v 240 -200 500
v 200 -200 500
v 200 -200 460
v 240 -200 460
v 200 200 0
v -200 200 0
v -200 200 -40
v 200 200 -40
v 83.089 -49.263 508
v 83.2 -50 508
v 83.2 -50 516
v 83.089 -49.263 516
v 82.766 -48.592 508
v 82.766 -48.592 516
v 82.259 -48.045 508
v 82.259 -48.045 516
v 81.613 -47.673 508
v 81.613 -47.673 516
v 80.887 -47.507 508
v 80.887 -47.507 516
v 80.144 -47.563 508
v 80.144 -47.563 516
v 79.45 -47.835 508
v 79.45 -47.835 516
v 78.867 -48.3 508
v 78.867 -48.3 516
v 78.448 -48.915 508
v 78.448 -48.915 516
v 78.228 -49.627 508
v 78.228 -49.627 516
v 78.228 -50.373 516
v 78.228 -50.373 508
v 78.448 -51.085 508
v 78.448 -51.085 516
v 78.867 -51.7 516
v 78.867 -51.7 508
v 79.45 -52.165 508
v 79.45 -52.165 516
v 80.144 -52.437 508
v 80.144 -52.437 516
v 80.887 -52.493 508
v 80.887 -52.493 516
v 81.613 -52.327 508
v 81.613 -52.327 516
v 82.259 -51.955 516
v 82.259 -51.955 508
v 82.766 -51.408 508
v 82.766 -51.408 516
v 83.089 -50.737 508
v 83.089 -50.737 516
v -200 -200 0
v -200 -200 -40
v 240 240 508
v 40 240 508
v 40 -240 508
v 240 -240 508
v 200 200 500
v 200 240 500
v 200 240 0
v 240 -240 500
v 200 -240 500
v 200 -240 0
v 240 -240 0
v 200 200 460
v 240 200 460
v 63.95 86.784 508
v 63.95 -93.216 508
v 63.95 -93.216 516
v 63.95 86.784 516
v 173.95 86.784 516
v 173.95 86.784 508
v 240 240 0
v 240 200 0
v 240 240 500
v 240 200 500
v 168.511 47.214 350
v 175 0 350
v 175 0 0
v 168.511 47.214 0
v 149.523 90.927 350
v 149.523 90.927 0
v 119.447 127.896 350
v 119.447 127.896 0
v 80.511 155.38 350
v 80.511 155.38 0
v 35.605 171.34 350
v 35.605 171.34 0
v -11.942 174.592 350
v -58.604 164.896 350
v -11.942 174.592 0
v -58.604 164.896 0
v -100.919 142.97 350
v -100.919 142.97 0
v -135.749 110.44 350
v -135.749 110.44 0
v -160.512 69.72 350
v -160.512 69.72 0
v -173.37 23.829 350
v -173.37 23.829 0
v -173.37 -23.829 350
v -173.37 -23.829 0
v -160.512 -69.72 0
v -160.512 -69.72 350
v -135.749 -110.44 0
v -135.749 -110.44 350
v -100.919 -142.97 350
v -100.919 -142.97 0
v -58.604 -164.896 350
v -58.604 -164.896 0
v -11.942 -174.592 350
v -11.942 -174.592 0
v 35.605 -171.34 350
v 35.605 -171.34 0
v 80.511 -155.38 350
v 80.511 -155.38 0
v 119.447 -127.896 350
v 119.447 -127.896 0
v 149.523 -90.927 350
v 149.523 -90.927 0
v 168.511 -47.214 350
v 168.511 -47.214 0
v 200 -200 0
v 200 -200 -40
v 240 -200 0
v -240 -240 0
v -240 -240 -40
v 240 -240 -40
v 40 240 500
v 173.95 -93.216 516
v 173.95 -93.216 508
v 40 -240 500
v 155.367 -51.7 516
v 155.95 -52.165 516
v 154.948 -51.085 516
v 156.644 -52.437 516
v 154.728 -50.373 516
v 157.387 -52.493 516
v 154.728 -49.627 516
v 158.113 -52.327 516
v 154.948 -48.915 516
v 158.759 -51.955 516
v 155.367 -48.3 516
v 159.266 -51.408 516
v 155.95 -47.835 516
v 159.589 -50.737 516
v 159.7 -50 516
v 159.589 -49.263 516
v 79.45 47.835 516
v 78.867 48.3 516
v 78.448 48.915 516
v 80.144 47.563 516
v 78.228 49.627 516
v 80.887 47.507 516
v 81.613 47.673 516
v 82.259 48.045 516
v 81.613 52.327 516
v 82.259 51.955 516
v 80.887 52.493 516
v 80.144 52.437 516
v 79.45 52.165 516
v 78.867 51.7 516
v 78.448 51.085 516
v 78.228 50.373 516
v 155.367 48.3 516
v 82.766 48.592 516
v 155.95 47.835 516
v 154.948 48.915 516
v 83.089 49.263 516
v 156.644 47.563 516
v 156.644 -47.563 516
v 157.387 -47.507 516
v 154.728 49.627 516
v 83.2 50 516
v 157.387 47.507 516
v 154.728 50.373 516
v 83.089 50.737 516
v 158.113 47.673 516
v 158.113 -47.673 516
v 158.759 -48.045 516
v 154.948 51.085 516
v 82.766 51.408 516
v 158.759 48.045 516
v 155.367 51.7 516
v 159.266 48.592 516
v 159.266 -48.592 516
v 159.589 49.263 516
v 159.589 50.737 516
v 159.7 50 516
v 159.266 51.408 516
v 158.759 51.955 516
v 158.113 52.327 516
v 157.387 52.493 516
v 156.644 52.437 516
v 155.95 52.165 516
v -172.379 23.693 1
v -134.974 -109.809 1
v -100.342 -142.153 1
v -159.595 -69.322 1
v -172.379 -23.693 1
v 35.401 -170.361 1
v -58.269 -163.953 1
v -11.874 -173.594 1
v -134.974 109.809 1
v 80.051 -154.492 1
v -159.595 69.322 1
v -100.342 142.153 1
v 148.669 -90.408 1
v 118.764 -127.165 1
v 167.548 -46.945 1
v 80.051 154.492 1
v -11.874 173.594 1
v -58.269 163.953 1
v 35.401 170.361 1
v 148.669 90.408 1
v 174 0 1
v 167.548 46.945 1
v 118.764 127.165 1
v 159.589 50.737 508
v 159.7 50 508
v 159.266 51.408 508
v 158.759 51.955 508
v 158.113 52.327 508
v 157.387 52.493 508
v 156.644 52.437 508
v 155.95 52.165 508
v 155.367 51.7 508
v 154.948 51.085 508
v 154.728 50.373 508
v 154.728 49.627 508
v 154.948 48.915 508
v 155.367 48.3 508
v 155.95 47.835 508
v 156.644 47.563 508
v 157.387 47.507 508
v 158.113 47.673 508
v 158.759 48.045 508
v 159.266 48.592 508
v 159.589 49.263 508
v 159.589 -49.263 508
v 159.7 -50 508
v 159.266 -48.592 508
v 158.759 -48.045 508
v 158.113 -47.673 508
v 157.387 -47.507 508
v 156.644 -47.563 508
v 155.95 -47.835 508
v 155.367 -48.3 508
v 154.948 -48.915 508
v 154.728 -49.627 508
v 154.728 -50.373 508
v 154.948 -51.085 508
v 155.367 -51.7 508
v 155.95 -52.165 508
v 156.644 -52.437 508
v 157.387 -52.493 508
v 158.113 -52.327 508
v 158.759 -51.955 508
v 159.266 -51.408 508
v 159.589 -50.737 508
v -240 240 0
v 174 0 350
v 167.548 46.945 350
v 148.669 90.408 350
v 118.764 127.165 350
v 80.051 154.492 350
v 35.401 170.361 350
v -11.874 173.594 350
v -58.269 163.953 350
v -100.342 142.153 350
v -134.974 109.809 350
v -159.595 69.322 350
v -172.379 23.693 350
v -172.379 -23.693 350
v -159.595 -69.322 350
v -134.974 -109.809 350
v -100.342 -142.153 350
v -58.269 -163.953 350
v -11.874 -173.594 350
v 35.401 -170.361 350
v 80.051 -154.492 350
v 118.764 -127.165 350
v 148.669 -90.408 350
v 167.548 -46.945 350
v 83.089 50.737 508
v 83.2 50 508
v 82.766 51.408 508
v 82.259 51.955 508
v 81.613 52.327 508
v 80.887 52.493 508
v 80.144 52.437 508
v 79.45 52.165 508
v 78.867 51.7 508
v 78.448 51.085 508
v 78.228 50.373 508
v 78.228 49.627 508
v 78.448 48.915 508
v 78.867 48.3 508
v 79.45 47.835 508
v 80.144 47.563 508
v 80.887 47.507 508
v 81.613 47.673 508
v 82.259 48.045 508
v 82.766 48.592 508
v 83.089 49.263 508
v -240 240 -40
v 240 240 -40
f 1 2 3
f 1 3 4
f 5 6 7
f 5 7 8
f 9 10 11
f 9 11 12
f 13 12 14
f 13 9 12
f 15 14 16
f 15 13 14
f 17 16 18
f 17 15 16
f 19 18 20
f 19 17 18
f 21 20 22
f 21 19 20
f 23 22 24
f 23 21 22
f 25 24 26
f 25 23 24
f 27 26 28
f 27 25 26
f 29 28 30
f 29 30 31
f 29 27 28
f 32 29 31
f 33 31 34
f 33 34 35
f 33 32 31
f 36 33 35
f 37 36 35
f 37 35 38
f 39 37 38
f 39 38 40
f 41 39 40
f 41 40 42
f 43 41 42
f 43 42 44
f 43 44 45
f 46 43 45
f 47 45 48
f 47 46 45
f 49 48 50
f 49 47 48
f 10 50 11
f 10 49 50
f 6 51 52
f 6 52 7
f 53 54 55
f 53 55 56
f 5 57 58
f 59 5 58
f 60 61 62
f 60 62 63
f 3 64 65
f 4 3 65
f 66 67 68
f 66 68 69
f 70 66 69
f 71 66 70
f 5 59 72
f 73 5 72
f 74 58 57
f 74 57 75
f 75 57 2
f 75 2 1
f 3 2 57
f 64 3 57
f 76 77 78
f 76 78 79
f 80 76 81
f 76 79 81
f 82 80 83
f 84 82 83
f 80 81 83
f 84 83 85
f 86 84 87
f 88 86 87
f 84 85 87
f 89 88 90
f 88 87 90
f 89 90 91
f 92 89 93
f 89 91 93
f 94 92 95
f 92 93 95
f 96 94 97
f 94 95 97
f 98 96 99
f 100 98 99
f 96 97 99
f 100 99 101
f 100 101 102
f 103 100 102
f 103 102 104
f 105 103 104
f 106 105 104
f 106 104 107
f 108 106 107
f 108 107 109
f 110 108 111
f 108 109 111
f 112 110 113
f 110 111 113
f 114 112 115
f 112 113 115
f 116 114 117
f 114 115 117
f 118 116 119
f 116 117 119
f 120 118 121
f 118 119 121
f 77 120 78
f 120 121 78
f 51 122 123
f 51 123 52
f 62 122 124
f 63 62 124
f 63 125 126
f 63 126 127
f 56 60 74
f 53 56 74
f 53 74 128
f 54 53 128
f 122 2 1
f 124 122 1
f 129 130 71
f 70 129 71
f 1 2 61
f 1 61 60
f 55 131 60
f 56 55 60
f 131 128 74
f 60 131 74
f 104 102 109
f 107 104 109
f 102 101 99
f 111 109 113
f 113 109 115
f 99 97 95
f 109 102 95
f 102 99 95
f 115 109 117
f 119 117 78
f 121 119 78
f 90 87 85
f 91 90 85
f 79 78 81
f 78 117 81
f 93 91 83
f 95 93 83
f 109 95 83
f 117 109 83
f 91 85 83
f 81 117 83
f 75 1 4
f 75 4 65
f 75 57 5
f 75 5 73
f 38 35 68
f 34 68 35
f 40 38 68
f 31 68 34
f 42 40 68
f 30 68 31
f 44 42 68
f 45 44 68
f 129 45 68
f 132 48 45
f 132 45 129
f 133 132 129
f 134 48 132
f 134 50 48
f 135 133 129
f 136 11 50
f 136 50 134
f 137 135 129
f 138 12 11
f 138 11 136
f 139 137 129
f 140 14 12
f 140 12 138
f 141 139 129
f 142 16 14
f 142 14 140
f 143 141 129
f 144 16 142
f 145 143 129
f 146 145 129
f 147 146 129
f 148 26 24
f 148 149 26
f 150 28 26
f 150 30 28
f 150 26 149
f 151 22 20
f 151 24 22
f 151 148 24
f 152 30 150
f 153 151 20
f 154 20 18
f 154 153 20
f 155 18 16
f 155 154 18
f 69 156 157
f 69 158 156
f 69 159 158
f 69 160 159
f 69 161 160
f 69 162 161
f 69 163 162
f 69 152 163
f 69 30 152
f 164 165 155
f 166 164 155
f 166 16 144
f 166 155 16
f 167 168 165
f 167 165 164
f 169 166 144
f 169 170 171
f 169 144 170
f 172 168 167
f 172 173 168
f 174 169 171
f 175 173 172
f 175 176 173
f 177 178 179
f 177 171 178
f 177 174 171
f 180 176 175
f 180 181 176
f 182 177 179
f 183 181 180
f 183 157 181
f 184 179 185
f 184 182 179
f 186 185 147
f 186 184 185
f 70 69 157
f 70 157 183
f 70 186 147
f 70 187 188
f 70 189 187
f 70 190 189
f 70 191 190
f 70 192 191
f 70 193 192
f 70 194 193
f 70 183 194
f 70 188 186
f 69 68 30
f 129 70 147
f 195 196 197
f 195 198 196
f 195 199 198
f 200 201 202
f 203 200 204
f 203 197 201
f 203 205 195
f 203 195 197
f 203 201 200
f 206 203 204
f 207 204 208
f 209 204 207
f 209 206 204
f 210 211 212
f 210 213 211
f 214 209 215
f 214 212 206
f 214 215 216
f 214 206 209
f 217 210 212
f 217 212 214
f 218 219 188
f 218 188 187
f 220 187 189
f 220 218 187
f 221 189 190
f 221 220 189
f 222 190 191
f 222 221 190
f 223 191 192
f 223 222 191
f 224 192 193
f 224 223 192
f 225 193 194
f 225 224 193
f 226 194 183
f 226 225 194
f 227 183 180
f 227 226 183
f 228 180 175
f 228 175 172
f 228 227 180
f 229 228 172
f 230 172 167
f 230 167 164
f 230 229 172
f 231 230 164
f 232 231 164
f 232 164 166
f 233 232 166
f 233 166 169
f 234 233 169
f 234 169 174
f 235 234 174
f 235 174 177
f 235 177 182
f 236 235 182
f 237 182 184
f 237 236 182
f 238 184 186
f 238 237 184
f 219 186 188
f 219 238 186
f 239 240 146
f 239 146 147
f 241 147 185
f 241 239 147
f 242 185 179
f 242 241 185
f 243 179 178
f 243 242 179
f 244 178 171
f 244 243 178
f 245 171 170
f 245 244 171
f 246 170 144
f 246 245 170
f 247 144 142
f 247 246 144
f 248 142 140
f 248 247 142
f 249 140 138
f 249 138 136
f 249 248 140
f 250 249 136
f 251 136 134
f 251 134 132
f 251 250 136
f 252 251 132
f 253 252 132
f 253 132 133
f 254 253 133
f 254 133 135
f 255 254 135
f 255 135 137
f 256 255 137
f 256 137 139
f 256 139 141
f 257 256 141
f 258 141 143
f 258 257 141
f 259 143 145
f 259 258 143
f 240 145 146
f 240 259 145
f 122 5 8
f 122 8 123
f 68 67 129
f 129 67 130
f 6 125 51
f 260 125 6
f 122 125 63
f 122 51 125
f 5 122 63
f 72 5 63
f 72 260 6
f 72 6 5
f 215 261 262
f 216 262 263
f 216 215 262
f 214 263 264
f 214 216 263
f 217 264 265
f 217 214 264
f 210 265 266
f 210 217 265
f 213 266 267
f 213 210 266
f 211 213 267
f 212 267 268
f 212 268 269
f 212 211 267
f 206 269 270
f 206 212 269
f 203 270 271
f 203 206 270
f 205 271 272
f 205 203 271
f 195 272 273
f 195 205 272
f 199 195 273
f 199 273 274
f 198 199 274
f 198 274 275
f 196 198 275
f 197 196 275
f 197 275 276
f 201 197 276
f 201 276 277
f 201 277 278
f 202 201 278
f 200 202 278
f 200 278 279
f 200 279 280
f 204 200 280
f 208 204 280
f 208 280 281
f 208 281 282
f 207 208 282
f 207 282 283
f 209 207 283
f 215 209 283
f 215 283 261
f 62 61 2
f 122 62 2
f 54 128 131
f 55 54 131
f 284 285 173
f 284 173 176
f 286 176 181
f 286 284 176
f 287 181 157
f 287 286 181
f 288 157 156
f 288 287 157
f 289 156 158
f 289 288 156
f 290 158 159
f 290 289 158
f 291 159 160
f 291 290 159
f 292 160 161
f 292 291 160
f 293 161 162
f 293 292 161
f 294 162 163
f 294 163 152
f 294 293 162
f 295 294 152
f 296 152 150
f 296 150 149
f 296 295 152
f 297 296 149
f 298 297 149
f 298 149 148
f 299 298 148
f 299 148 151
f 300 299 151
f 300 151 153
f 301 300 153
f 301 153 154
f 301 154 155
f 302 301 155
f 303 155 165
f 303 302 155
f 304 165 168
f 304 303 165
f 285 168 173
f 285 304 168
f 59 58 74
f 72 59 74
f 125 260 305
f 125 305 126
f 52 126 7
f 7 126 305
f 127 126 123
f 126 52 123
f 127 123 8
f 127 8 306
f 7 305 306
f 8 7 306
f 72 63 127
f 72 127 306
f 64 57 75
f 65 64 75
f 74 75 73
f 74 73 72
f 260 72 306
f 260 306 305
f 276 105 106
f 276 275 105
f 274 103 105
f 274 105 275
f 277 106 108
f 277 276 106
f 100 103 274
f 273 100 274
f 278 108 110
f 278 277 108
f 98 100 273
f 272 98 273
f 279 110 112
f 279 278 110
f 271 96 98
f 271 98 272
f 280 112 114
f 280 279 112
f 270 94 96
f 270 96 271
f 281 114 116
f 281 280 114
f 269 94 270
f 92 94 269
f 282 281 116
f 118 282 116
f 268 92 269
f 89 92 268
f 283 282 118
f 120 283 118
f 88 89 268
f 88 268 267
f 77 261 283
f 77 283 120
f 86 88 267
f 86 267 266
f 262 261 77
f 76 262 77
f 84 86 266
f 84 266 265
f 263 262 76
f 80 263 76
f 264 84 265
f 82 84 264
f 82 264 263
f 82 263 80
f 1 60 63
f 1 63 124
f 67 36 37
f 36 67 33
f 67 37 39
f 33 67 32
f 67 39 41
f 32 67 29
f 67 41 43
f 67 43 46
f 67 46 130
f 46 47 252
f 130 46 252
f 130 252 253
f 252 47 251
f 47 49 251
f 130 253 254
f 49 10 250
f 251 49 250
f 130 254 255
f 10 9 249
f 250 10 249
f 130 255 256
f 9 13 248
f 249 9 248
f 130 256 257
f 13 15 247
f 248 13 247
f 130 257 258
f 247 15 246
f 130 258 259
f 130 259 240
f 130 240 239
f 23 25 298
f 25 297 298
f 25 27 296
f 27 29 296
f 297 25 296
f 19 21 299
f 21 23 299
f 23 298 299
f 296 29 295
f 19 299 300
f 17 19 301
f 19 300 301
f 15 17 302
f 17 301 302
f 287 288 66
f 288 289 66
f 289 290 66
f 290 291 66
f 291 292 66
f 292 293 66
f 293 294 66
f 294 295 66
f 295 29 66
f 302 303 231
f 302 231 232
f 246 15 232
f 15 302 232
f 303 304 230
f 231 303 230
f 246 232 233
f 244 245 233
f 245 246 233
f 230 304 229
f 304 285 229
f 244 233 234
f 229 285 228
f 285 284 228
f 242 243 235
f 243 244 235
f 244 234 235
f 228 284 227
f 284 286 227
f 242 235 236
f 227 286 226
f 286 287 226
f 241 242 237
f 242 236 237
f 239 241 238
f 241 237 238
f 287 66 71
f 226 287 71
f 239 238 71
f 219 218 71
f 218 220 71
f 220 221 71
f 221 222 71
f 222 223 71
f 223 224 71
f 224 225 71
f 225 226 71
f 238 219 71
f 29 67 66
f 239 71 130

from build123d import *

# Parameters (mm, degrees)
F0_W      = 400
F0_H      = 40
F0_W_2    = 40
F0_H_2    = 400
F1_DEPTH  = 40
F2_DEPTH  = 500
F4_W      = 40
F4_H      = 400
F5_DEPTH  = 40
F6_R      = 175
F7_DEPTH  = 350
F8_T      = -1
F9_DEPTH  = 8
F10_W     = 110
F10_H     = 180
F10_R     = 2.5
F11_DEPTH = 8


with BuildPart() as f1:
    # F0 (on Top) → F1 (new body)
    with BuildSketch(Plane.XY):
        with Locations((0, 220)):
            Rectangle(F0_W, F0_H)
        with Locations((220, 220)):
            Rectangle(F0_W_2, F0_H)
        with Locations((220, 0)):
            Rectangle(F0_W_2, F0_H_2)
        with Locations((220, -220)):
            Rectangle(F0_W_2, F0_H)
        with Locations((-220, 0)):
            Rectangle(F0_W_2, F0_H_2)
        with Locations((-220, 220)):
            Rectangle(F0_W_2, F0_H)
        Polygon((200, -240), (200, -200), (-200, -200), (-240, -200), (-240, -240), (-200, -240), align=None)
    extrude(amount=-F1_DEPTH)


with BuildPart() as f2:
    # F0 (on Top) → F2 (new body)
    with BuildSketch(Plane.XY):
        with Locations((220, 220)):
            Rectangle(F0_W_2, F0_H)
    extrude(amount=F2_DEPTH)


with BuildPart() as f2b:
    # F0 (on Top) → F2, piece 2 (new body)
    with BuildSketch(Plane.XY):
        with Locations((220, -220)):
            Rectangle(F0_W_2, F0_H)
    extrude(amount=F2_DEPTH)


with BuildPart() as f5:
    # F4 (on plane+point) → F5 (new body)
    with BuildSketch(Plane.XY.offset(500)):
        with Locations((220, 0)):
            Rectangle(F4_W, F4_H)
    extrude(amount=-F5_DEPTH)


with BuildPart() as f7:
    # F6 (on Top) → F7 (new body)
    with BuildSketch(Plane.XY):
        Circle(F6_R)
    extrude(amount=F7_DEPTH)

    # F8
    f8_openings = [f7.faces().sort_by_distance(p)[0] for p in [
        (0, 0, 350),
    ]]
    offset(amount=F8_T, openings=f8_openings)


with BuildPart() as f9:
    # F4 (on plane+point) → F9 (new body)
    with BuildSketch(Plane.XY.offset(500)):
        Polygon((200, 200), (240, 200), (240, 240), (40, 240), (40, -240), (240, -240), (240, -200), (200, -200), align=None)
        with Locations((220, 0)):
            Rectangle(F4_W, F4_H)
    extrude(amount=F9_DEPTH)


with BuildPart() as f11:
    # F10 (on face) → F11 (new body)
    with BuildSketch(Plane.XY.offset(508)):
        with Locations((118.95, -3.2155030966)):
            Rectangle(F10_W, F10_H)
        with Locations((80.7, -50)):
            Circle(F10_R, mode=Mode.SUBTRACT)
        with Locations((157.2, -50)):
            Circle(F10_R, mode=Mode.SUBTRACT)
        with Locations((80.7, 50)):
            Circle(F10_R, mode=Mode.SUBTRACT)
        with Locations((157.2, 50)):
            Circle(F10_R, mode=Mode.SUBTRACT)
    extrude(amount=F11_DEPTH)


solid = Compound([f1.part, f2.part, f2b.part, f5.part, f7.part, f9.part, f11.part])
